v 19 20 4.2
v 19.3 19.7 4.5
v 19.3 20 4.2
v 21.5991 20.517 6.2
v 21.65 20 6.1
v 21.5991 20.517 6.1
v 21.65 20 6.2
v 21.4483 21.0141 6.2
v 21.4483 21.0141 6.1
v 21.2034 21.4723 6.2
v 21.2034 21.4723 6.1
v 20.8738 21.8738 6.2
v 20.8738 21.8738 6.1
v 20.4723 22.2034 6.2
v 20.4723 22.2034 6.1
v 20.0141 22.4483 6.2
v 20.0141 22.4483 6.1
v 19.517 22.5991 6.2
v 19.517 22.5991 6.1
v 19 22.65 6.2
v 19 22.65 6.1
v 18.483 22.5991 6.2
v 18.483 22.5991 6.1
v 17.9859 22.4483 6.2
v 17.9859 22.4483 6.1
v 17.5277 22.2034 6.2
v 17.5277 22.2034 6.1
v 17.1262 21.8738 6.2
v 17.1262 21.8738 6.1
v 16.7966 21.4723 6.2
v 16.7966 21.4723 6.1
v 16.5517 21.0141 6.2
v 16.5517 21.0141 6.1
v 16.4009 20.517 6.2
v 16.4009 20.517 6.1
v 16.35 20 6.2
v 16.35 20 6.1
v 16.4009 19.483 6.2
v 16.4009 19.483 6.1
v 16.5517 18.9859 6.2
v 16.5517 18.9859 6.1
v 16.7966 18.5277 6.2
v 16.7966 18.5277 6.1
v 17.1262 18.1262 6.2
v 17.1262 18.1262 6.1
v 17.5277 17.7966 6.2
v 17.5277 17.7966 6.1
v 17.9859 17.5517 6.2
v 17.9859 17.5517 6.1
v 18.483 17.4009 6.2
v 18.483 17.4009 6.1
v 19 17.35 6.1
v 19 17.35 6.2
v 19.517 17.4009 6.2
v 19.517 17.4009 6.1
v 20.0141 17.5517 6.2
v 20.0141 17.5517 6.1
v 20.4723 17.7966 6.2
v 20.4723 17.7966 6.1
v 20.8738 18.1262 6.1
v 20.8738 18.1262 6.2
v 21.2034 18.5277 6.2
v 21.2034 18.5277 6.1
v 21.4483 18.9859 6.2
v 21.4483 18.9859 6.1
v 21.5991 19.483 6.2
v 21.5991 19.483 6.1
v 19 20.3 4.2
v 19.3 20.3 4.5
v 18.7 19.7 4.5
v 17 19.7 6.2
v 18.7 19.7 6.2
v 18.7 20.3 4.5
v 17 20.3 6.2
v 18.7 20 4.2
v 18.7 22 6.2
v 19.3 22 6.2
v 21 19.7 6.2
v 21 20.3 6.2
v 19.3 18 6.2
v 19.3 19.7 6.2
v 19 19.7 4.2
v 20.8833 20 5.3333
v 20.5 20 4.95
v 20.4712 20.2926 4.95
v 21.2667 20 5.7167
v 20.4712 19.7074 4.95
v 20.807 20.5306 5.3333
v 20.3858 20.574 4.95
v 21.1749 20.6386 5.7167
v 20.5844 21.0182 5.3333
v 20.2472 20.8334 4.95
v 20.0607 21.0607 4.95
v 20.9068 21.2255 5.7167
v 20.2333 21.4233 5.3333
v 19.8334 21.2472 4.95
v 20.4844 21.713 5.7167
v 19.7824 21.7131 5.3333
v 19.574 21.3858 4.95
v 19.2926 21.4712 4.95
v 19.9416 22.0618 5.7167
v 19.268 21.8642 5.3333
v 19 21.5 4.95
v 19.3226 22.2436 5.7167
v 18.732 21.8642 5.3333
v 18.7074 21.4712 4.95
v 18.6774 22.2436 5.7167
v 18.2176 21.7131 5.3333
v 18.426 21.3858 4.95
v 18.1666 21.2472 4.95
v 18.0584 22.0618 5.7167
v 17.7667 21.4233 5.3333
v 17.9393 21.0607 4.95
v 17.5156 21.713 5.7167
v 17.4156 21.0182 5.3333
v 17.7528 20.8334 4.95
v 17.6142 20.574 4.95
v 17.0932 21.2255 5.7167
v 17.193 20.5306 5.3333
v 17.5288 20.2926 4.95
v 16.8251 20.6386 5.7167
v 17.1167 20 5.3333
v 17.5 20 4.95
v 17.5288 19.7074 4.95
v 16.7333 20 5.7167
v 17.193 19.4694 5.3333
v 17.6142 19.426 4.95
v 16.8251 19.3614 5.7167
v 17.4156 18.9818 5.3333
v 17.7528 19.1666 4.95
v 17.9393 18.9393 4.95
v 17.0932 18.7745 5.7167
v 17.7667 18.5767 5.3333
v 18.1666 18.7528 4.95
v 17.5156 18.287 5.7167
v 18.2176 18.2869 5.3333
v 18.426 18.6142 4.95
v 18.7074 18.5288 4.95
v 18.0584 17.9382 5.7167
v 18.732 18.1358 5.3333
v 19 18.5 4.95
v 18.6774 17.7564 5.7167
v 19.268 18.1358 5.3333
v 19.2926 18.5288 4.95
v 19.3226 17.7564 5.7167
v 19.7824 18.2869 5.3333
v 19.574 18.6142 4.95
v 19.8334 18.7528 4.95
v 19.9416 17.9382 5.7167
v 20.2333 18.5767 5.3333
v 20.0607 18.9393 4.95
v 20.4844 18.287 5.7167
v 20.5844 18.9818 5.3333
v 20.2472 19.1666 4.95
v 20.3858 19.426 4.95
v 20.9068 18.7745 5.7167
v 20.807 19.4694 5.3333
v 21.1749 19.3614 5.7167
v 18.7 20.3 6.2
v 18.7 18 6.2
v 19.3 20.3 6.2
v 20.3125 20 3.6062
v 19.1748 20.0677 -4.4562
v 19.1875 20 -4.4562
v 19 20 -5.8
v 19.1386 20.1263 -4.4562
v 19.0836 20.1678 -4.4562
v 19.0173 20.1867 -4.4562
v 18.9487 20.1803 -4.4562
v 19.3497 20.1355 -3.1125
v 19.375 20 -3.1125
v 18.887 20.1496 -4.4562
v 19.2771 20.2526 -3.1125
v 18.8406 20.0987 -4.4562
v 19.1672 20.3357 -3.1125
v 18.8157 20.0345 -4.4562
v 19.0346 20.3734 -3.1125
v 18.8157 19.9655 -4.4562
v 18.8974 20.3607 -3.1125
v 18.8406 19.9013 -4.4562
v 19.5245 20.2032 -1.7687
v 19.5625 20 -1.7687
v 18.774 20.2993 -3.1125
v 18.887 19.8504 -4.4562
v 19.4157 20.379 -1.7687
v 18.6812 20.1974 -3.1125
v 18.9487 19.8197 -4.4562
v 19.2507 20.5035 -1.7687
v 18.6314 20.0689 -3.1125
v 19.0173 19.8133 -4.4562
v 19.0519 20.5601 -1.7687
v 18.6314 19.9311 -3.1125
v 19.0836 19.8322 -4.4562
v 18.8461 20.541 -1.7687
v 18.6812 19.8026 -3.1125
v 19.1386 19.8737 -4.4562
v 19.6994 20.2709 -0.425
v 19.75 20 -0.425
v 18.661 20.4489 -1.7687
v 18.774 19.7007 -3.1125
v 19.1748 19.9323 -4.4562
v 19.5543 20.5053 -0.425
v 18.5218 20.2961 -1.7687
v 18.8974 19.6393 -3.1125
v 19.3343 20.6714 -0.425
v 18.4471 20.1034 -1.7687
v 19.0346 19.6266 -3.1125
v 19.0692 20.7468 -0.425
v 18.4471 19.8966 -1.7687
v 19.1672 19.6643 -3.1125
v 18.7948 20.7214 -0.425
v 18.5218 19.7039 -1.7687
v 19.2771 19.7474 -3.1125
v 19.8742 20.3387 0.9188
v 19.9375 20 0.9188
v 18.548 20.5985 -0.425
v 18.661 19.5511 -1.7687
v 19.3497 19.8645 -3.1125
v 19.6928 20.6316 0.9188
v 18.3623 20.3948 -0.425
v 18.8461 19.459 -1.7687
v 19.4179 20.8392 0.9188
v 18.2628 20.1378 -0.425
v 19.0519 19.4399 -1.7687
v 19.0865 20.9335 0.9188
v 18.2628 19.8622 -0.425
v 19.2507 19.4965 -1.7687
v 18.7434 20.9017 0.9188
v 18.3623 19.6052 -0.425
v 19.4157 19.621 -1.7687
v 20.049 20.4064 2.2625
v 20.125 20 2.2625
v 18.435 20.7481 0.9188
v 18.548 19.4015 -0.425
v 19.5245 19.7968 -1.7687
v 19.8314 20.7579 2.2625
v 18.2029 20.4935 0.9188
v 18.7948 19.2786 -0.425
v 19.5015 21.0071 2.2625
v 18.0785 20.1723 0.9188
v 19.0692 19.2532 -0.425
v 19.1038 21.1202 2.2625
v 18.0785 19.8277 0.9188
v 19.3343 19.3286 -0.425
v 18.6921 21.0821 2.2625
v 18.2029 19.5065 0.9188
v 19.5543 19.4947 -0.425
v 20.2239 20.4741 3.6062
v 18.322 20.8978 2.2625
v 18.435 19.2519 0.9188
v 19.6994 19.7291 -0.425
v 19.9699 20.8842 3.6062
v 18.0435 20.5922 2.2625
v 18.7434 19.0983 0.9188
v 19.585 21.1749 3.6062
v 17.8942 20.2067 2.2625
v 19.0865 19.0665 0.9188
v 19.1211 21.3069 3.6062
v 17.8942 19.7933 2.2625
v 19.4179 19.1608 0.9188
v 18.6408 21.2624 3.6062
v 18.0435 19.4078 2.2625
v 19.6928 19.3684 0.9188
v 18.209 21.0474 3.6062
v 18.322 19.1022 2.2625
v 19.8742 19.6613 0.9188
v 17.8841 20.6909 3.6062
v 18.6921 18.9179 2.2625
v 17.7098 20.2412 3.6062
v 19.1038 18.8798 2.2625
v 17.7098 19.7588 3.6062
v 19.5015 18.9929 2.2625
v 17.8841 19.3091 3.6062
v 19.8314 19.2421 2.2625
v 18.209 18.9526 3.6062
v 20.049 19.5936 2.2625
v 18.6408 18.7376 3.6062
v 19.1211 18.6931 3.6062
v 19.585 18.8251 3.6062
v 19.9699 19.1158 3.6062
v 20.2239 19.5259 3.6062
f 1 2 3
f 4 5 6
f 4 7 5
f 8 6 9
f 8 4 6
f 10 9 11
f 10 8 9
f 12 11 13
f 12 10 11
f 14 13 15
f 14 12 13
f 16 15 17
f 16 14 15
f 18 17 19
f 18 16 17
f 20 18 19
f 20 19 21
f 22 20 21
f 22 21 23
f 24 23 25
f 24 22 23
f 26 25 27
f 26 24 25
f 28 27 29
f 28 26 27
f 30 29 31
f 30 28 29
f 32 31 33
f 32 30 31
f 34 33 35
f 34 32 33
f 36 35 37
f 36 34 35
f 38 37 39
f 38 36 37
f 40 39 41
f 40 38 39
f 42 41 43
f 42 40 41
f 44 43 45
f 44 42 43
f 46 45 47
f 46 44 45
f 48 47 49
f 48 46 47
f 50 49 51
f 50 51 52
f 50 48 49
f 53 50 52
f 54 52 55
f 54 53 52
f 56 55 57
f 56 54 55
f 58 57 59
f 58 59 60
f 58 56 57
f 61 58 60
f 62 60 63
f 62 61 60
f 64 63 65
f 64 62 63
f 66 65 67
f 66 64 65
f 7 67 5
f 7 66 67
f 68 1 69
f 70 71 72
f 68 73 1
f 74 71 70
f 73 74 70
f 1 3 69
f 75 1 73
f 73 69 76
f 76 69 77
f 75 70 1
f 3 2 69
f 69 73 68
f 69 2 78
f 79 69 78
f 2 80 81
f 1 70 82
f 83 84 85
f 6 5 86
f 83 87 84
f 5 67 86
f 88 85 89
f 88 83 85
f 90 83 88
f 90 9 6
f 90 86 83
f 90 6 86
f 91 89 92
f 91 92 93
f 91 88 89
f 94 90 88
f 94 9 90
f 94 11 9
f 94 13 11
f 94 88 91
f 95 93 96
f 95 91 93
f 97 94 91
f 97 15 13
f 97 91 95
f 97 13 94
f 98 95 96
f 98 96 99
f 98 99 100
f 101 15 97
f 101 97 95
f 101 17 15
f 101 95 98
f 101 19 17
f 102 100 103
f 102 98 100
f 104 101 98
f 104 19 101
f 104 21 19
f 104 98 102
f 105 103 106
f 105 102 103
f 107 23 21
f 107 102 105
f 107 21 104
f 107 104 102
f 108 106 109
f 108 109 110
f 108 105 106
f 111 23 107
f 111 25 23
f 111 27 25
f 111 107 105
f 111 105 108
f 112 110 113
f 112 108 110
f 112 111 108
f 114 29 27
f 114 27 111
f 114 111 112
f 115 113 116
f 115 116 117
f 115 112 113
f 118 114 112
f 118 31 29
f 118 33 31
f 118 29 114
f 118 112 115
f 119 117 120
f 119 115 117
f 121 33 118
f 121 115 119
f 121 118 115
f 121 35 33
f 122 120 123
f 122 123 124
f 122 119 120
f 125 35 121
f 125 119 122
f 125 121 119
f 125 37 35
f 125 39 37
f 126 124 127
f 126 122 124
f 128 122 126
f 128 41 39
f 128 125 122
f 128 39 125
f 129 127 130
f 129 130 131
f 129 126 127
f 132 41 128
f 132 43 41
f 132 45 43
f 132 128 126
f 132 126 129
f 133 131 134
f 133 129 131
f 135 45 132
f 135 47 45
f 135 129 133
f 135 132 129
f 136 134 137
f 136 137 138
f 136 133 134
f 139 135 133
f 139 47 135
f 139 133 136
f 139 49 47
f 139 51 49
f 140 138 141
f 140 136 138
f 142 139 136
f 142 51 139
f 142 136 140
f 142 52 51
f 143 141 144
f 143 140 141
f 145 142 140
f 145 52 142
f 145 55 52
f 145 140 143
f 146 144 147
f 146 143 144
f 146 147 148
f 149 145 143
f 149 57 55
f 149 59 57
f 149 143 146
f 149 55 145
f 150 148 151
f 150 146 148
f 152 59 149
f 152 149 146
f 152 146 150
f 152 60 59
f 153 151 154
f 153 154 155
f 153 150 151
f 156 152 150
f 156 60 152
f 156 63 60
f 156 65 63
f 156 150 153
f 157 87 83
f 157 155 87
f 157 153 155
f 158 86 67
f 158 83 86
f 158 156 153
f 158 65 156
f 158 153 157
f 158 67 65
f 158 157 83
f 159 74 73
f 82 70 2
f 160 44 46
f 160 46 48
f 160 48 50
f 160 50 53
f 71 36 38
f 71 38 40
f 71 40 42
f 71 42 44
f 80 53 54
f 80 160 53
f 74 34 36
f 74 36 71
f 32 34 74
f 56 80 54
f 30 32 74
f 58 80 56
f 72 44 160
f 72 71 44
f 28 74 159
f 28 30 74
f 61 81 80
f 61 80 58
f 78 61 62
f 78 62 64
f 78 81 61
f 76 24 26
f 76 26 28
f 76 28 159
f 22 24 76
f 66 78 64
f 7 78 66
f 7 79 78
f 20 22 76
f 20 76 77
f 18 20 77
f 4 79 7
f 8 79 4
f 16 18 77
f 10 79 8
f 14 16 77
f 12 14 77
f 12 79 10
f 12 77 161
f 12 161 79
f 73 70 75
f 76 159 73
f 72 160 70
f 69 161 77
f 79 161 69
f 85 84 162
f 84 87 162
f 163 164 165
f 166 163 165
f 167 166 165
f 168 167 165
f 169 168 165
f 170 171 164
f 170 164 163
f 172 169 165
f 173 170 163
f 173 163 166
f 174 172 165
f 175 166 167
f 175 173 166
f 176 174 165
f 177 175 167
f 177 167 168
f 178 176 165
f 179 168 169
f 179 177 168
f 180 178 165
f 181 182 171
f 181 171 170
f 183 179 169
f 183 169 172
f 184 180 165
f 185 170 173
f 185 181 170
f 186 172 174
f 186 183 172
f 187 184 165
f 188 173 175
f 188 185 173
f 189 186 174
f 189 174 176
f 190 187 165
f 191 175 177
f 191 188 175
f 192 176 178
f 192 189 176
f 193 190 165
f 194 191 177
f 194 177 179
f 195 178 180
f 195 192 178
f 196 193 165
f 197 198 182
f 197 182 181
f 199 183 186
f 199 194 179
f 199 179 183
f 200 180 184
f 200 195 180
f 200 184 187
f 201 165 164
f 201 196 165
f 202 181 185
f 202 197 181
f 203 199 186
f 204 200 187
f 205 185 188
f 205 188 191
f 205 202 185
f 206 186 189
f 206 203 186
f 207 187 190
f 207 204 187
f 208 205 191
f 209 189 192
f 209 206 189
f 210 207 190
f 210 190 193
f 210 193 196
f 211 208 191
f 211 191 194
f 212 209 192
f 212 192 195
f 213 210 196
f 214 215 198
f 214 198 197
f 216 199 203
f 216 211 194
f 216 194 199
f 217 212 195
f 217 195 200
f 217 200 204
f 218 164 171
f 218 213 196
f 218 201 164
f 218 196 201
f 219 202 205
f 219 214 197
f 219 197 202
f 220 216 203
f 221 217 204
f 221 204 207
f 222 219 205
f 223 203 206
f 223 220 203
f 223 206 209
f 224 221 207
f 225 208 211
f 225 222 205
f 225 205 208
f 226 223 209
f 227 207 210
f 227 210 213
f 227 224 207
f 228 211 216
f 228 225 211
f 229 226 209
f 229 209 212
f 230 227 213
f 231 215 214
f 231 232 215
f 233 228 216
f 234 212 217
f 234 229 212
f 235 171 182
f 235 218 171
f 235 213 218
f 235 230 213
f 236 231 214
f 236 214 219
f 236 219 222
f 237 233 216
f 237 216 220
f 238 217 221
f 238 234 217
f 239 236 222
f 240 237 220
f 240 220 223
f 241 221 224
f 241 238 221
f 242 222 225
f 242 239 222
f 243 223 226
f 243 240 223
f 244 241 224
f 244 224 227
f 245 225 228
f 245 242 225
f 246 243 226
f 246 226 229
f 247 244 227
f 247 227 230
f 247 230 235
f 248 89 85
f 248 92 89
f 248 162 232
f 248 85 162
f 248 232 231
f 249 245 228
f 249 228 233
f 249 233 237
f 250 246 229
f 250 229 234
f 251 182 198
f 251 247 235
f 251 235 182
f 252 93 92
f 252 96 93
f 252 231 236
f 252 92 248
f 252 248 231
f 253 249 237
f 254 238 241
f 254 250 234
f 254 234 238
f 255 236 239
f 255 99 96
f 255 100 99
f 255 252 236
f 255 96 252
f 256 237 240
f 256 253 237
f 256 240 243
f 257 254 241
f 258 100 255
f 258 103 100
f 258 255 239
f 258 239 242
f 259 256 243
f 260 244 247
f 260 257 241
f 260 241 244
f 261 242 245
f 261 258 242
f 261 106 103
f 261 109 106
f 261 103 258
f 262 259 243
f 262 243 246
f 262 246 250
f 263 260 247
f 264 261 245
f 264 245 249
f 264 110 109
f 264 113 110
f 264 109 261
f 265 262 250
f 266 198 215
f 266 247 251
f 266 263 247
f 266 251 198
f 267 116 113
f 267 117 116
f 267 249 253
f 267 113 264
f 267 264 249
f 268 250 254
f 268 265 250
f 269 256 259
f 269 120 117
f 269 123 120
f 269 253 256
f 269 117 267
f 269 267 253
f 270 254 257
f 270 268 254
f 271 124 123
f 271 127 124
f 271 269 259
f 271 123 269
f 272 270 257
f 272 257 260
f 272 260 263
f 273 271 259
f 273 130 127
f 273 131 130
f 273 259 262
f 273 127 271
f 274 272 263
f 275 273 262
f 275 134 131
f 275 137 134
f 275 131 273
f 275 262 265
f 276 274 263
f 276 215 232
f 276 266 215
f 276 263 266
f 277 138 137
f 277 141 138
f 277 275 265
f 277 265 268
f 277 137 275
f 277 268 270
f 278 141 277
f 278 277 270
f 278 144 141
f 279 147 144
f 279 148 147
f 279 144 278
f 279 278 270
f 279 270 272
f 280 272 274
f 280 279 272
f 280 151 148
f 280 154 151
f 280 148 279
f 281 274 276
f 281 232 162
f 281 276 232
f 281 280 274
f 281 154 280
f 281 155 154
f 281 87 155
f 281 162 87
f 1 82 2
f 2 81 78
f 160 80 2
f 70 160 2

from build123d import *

# Parameters (mm, degrees)
POCKET001_DEPTH    = 0.3
POLARPATTERN_COUNT = 2
POLARPATTERN_ANGLE = 90


with BuildPart() as part:
    # Sketch013 → Revolution (revolve)
    with BuildSketch(Plane.XZ):
        Polygon((0, 0), (0, -12), (1.5, -1.25), (2.65, -0.1), (2.65, 0), align=None)
    revolve(axis=Axis((0, 0, 0), (0, 0, 1)))

    # Sketch014 → Pocket001 (cut, symmetric)
    with BuildSketch(Plane.XZ):
        Polygon((-2, 0), (0, -2), (2, 0), align=None)
    pocket001 = extrude(amount=POCKET001_DEPTH, both=True, mode=Mode.SUBTRACT)

    # PolarPattern: Pocket001 ×2 about axis
    polarpattern_axis = Axis((0, 0, 0), (0, 0, 1))
    for i in range(1, POLARPATTERN_COUNT):
        add(pocket001.rotate(polarpattern_axis, i * POLARPATTERN_ANGLE / (POLARPATTERN_COUNT - 1)), mode=Mode.SUBTRACT)


with BuildPart() as part_1:
    # Body011 placement: moved
    add(part.part.moved(Location((19, 20, 6.2))))


solid = part_1.part
